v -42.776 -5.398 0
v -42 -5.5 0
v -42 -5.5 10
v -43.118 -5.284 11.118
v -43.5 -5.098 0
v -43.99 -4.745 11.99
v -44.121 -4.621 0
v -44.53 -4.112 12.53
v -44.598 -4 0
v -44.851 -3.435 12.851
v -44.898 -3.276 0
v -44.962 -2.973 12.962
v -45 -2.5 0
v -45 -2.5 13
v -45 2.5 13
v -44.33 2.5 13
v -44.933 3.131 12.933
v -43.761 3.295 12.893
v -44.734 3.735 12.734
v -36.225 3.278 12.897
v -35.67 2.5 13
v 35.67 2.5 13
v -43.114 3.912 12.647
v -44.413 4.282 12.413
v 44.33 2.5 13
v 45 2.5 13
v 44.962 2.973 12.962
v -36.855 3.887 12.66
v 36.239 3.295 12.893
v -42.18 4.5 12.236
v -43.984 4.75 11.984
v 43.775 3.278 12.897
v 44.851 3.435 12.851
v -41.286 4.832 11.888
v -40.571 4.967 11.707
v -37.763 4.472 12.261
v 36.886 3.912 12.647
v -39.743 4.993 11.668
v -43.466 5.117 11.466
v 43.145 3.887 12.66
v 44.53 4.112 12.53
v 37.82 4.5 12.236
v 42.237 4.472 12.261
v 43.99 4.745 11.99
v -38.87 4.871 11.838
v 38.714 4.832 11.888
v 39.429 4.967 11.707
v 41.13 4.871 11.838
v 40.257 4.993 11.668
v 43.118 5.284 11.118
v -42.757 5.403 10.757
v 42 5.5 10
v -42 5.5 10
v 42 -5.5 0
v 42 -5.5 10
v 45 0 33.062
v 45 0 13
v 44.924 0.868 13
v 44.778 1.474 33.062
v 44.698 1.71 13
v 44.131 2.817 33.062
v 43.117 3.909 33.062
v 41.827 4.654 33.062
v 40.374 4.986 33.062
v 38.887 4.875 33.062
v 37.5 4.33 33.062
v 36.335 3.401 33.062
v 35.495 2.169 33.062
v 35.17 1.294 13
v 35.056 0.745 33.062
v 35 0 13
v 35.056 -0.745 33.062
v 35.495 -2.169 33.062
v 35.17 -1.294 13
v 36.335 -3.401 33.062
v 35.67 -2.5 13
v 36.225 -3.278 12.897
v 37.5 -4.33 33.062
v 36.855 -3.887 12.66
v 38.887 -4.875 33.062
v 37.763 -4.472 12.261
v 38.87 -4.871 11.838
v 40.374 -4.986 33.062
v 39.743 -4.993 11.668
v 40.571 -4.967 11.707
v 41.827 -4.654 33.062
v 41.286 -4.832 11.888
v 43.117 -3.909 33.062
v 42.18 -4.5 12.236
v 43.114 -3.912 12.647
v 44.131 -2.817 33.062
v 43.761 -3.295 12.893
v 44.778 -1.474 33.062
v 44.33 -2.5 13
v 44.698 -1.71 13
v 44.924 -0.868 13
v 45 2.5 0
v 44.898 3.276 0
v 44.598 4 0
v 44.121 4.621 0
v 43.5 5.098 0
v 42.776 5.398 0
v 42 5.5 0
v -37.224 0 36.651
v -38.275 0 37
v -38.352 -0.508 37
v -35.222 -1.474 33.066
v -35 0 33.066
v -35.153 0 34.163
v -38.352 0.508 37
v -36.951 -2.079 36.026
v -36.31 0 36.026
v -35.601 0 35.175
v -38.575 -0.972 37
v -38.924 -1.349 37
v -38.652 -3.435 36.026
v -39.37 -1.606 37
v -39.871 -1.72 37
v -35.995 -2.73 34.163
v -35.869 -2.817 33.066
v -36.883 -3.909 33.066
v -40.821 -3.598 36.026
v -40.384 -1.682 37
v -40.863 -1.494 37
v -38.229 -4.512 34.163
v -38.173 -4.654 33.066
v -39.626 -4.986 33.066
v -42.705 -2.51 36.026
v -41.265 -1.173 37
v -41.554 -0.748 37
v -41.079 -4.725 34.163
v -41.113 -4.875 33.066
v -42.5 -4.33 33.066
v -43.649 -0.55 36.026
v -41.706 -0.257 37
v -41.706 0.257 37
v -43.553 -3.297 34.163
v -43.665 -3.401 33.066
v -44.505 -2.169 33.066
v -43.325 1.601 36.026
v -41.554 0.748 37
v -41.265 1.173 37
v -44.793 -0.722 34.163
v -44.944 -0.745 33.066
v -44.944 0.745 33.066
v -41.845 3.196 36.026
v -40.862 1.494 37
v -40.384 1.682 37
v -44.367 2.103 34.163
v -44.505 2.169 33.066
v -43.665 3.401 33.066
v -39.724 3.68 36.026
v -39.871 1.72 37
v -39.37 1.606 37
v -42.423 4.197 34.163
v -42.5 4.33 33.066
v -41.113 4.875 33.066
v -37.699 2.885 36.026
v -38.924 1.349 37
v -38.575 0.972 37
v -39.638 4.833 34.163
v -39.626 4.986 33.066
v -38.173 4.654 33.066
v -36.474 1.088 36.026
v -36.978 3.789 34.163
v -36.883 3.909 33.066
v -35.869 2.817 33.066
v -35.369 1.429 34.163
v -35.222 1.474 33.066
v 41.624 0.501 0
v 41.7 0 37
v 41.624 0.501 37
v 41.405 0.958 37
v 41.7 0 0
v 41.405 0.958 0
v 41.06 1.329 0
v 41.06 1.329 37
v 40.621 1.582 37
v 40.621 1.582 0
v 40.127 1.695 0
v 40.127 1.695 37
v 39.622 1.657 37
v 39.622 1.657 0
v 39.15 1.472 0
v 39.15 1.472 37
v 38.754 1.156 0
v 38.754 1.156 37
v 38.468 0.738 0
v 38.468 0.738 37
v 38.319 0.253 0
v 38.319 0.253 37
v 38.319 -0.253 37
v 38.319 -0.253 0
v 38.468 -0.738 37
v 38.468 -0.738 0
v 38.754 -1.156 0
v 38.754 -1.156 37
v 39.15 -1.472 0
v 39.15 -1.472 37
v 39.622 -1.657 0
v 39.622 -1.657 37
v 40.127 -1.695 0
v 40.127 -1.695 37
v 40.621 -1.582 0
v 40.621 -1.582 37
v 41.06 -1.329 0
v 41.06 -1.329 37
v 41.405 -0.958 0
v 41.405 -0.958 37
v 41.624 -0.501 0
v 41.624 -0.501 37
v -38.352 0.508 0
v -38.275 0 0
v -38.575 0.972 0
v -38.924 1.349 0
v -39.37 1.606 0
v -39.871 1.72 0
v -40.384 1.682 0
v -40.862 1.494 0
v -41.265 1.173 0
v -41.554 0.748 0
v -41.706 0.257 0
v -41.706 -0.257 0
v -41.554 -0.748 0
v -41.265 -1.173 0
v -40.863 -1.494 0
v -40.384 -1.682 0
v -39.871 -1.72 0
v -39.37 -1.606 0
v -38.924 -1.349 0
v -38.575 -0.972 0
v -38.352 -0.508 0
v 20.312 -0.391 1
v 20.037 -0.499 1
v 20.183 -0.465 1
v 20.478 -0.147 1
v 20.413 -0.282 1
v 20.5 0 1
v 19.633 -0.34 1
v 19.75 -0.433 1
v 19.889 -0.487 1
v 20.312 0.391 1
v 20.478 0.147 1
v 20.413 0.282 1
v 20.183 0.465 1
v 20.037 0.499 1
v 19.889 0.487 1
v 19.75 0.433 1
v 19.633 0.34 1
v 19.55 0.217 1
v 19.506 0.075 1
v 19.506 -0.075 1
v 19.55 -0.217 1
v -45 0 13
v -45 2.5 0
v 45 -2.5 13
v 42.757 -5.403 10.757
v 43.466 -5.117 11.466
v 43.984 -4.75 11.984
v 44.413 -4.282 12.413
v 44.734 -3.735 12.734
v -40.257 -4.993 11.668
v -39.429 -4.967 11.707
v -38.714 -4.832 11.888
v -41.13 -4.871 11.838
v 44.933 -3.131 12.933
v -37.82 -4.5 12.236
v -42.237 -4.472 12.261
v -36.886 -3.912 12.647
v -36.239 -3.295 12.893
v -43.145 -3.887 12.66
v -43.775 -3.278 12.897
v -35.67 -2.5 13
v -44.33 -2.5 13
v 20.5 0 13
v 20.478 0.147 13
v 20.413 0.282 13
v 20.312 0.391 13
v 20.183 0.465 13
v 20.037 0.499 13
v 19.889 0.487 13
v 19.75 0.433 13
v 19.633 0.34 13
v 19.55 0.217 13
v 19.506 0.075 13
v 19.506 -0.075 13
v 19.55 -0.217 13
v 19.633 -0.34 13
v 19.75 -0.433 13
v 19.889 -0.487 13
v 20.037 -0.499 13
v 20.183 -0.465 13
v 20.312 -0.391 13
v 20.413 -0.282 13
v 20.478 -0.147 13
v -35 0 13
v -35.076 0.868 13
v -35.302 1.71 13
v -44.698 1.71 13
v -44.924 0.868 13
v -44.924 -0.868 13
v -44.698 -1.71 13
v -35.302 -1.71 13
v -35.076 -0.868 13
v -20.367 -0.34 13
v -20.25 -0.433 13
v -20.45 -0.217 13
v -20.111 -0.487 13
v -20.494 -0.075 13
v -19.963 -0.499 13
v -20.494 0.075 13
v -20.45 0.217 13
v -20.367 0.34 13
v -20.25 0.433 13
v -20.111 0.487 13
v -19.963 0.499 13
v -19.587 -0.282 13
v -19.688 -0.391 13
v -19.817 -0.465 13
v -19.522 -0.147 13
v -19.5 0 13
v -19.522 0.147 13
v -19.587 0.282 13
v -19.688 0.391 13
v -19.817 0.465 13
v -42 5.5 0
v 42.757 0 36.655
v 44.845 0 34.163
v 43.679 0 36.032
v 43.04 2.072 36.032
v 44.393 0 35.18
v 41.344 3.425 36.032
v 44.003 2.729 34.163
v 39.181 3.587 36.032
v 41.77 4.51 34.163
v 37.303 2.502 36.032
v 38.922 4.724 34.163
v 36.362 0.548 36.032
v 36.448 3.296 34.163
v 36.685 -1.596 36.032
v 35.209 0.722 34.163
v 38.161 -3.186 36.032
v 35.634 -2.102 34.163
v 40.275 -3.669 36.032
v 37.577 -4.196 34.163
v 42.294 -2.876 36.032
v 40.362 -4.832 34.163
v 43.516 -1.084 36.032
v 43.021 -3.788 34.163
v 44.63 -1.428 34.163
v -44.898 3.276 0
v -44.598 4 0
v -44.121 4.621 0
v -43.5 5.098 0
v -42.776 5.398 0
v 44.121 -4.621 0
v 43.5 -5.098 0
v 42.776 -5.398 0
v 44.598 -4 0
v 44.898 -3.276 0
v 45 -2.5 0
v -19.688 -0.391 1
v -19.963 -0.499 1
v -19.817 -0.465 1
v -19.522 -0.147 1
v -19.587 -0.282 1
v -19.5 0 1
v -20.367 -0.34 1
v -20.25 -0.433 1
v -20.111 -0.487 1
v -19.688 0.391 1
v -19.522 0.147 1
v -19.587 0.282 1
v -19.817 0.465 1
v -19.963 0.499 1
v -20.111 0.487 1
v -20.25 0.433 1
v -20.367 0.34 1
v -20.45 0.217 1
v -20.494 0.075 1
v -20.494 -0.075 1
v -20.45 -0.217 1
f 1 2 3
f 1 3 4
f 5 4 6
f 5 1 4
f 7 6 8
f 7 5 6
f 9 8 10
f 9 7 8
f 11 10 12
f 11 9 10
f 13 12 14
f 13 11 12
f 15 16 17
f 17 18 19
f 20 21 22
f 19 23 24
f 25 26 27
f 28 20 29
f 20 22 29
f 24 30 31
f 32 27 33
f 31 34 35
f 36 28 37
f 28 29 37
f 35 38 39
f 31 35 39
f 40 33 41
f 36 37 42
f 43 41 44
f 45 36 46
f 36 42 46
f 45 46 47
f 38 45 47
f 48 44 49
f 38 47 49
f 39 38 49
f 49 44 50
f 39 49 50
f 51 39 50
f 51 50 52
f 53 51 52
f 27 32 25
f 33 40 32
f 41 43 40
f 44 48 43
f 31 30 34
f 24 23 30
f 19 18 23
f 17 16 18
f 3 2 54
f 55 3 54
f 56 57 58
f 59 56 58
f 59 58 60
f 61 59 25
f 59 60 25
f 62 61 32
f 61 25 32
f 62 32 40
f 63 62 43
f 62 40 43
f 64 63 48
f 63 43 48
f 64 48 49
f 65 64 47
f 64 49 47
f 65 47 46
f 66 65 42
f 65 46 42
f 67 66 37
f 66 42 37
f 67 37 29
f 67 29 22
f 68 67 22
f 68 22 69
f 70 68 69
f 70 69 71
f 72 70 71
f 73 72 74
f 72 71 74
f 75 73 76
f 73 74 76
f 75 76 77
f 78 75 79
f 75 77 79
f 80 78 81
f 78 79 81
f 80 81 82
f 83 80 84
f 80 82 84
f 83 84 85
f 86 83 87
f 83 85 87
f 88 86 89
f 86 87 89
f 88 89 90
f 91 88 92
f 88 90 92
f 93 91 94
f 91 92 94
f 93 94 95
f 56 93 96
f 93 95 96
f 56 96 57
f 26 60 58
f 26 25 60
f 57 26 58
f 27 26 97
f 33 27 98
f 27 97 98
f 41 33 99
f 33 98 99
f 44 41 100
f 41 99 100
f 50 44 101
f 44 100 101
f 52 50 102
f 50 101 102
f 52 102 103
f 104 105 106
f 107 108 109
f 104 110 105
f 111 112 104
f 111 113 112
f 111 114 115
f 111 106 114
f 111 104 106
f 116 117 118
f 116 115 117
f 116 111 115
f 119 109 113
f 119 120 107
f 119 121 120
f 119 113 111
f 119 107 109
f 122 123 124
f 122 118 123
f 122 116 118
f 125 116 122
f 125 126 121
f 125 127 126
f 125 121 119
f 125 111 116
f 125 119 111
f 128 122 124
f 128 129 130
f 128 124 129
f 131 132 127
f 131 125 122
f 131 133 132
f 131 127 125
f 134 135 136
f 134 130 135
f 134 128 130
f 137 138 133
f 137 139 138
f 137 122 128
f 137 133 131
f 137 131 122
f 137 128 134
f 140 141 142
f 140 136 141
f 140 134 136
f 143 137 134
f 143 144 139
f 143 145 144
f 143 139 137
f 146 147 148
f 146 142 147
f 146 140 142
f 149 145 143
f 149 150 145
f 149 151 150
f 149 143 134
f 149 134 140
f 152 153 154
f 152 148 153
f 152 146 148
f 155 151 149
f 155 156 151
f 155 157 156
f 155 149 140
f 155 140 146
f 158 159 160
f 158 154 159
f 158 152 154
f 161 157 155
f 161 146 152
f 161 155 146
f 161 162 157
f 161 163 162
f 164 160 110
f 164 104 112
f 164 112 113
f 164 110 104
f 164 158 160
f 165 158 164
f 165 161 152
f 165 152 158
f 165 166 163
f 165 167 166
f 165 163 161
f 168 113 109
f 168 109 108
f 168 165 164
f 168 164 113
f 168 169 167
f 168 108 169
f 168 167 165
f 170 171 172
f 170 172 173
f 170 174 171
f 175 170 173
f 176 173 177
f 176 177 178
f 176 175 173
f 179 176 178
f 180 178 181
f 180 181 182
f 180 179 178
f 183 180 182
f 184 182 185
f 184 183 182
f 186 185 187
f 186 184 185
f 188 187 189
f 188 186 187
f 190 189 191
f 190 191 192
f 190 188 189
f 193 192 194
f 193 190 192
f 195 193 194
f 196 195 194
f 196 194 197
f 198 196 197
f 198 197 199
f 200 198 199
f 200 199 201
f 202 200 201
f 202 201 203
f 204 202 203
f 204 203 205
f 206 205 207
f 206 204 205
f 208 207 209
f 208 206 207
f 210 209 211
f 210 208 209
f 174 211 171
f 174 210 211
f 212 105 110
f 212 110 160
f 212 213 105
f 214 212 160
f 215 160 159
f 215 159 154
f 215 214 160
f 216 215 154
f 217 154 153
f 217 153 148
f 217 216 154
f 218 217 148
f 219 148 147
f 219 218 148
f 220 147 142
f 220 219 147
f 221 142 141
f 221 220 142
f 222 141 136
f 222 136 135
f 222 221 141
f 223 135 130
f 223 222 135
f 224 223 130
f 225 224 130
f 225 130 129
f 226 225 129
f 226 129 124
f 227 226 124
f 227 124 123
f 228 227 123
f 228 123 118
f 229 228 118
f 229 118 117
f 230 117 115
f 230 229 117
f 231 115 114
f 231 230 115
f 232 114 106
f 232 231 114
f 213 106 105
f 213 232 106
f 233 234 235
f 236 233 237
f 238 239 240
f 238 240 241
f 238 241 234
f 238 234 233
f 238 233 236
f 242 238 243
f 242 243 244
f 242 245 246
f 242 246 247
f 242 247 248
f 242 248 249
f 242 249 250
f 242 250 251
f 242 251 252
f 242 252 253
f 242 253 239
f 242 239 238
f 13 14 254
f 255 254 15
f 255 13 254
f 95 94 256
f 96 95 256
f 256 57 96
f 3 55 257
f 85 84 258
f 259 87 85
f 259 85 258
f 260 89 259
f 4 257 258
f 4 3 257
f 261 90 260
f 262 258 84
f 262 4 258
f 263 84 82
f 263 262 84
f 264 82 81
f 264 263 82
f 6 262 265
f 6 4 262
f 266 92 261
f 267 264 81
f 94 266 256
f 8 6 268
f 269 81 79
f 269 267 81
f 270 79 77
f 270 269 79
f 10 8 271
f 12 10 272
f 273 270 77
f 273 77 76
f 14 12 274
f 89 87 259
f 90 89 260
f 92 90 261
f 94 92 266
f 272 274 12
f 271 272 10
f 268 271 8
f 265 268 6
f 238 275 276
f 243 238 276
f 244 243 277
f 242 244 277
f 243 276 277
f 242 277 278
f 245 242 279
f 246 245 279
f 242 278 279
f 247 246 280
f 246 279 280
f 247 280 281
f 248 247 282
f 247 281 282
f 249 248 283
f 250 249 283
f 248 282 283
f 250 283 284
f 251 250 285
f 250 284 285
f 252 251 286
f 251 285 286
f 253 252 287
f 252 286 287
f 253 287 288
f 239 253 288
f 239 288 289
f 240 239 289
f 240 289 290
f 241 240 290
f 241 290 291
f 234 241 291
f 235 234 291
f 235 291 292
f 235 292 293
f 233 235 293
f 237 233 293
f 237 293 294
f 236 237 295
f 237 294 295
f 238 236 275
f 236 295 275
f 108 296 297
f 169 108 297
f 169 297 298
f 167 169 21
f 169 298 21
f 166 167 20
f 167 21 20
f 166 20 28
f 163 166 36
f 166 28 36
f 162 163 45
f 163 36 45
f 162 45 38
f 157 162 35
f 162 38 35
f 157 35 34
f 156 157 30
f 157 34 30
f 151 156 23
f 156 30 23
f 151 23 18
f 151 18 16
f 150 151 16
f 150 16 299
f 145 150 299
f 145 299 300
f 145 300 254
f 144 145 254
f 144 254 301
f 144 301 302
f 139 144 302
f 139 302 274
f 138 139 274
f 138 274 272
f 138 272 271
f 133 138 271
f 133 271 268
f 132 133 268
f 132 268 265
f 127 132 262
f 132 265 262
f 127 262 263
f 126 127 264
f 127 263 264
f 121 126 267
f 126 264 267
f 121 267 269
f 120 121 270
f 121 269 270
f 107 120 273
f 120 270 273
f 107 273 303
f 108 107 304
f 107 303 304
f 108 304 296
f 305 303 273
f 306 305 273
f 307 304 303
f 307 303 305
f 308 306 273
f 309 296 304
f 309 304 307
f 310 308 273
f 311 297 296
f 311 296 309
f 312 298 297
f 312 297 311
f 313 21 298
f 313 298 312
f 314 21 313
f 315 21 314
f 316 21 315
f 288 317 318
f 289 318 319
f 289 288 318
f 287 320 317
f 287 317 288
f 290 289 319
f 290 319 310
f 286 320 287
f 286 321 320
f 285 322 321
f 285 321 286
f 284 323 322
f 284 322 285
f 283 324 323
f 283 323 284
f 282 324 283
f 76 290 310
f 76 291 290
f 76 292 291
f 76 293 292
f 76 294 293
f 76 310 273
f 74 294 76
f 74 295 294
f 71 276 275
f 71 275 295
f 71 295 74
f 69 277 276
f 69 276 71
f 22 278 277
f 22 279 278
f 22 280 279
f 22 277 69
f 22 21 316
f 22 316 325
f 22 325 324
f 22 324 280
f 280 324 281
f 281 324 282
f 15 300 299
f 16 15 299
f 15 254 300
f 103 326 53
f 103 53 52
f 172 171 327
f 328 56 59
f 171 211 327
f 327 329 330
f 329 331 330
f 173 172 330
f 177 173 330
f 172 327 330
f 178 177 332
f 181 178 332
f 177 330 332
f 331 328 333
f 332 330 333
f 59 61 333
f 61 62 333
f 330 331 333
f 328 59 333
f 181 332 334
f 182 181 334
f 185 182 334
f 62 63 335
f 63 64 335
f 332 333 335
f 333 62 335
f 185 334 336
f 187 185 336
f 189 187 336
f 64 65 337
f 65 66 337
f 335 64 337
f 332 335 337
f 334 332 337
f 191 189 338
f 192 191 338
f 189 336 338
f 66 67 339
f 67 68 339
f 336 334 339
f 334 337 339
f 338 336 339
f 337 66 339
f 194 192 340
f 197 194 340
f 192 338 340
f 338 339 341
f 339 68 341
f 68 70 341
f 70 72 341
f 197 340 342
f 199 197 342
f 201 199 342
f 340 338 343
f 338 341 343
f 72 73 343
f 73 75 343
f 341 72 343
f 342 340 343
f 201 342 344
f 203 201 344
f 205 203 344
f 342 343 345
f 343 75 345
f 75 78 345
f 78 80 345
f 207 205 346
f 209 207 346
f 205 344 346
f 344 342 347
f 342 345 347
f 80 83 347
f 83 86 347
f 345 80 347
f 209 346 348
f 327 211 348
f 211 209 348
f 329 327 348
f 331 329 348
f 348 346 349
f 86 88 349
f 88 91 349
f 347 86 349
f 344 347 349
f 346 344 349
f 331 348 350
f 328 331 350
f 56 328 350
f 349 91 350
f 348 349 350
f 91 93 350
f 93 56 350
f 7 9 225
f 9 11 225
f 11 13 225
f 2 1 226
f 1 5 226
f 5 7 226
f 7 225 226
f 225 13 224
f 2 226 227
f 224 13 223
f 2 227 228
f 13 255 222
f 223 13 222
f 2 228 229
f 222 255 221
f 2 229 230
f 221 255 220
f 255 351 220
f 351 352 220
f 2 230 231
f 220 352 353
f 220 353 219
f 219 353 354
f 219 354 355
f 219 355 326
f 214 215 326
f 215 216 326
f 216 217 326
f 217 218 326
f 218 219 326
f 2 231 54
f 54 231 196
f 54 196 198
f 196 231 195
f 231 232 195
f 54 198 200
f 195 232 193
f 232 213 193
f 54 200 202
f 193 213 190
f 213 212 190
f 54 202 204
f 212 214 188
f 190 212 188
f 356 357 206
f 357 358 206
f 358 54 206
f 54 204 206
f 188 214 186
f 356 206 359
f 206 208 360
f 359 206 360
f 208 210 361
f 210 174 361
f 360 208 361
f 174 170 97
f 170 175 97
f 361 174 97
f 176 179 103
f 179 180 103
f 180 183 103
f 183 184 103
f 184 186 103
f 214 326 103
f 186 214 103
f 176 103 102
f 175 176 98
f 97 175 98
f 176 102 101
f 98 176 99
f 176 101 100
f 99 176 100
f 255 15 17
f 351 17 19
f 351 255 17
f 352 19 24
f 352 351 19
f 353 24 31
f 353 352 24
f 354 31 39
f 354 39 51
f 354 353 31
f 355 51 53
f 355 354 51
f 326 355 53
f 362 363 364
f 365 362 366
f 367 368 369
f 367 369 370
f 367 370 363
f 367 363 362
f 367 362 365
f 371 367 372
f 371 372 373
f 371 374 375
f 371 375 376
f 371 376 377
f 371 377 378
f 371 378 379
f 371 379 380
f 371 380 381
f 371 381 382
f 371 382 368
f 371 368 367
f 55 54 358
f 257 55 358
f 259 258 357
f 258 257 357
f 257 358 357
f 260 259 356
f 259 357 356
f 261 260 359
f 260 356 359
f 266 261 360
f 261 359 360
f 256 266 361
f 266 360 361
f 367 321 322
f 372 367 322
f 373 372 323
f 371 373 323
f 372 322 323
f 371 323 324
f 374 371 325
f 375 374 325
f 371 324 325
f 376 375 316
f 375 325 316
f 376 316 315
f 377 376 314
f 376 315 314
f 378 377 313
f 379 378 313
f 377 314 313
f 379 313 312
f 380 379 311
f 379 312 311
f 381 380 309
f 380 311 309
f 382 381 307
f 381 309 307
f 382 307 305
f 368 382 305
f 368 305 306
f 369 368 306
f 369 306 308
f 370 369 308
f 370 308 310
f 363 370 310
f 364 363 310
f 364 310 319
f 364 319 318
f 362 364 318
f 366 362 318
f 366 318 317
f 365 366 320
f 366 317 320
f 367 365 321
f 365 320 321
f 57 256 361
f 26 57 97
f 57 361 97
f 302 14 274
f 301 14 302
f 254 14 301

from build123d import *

# Parameters (mm, degrees)
F0_W         = 90
F0_H         = 11
F0_R         = 1.725
F0_R_2       = 1.7
F1_DEPTH     = 13
F2_R         = 5
F2_R_2       = 1.7
F3_DEPTH     = 24
F4_R         = 1.725
F5_DEPTH     = 24
F6_R         = 0.5
F7_DEPTH     = 12
F8_T1_DEPTH  = 28
F8_T6_DEPTH  = 105
F8_S7_R      = 5
F8_T8_DEPTH  = 54
F8_S9_R      = 5
F8_T10_DEPTH = 54
F8_T14_DEPTH = 105
F8_S15_R     = 5
F8_T16_DEPTH = 54
F8_S17_R     = 5
F8_T18_DEPTH = 54


# Not quite as in the source:
# - a fillet or chamfer that OpenCascade refuses, or shapes differently, is made with other operations: its cross-section is extruded or revolved along the edge and cut away or added
# - a feature names something its author has since deleted; it is built from what else it names


with BuildPart() as f1:
    # F0 (on Top) → F1 (new body)
    with BuildSketch(Plane.XY):
        Rectangle(F0_W, F0_H)
        with Locations((-40, 0)):
            Circle(F0_R, mode=Mode.SUBTRACT)
        with Locations((40, 0)):
            Circle(F0_R_2, mode=Mode.SUBTRACT)
    extrude(amount=F1_DEPTH)

    # F2 (on face) → F3 (join)
    with BuildSketch(Plane.XY.offset(13)):
        with Locations((40, 0)):
            Circle(F2_R)
        with Locations((40, 0)):
            Circle(F2_R_2, mode=Mode.SUBTRACT)
    extrude(amount=F3_DEPTH)

    # F4 (on face) → F5 (join)
    with BuildSketch(Plane.XY.offset(13)):
        with BuildLine():
            ThreePointArc((-45, 0), (-40, -5), (-35, 0))
            ThreePointArc((-35, 0), (-40, 5), (-45, 0))
        make_face()
        with Locations((-40, 0)):
            Circle(F4_R, mode=Mode.SUBTRACT)
    extrude(amount=F5_DEPTH)

    # F6 (on face) → F7 (cut)
    with BuildSketch(Plane.XY.offset(13)):
        with Locations((-20, 0)):
            Circle(F6_R)
        with Locations((20, 0)):
            Circle(F6_R)
    extrude(amount=-F7_DEPTH, mode=Mode.SUBTRACT)

    # F8: fillet of radius 3 on 6 edges, made by hand

    # F8_s2 → F8_t1 (cut)
    with BuildSketch(Plane.XY.offset(-7.5)):
        with BuildLine():
            ThreePointArc((-42, -5.5), (-44.1213203436, -4.6213203436), (-45, -2.5))
            Line((-45, -2.5), (-45, -5.5))
            Line((-45, -5.5), (-42, -5.5))
        make_face()
        with BuildLine():
            ThreePointArc((-45, 2.5), (-44.1213203436, 4.6213203436), (-42, 5.5))
            Line((-42, 5.5), (-45, 5.5))
            Line((-45, 5.5), (-45, 2.5))
        make_face()
        with BuildLine():
            ThreePointArc((42, -5.5), (44.1213203436, -4.6213203436), (45, -2.5))
            Line((45, -2.5), (45, -5.5))
            Line((45, -5.5), (42, -5.5))
        make_face()
        with BuildLine():
            ThreePointArc((45, 2.5), (44.1213203436, 4.6213203436), (42, 5.5))
            Line((42, 5.5), (45, 5.5))
            Line((45, 5.5), (45, 2.5))
        make_face()
    extrude(amount=F8_T1_DEPTH, mode=Mode.SUBTRACT)


with BuildPart() as f8_tool4:
    # F8_s5 → F8_t6 (new body)
    with BuildSketch(Plane.YZ.offset(-52.5)):
        with BuildLine():
            ThreePointArc((-5.5, 10), (-4.6213203436, 12.1213203436), (-2.5, 13))
            Line((-2.5, 13), (-5.5, 13))
            Line((-5.5, 13), (-5.5, 10))
        make_face()
    extrude(amount=F8_T6_DEPTH)

    # F8_s7 → F8_t8 (cut, symmetric)
    with BuildSketch(Plane.XY.offset(11.5)):
        with Locations((-40, 0)):
            Circle(F8_S7_R)
    extrude(amount=F8_T8_DEPTH, both=True, mode=Mode.SUBTRACT)

    # F8_s9 → F8_t10 (cut, symmetric)
    with BuildSketch(Plane.XY.offset(11.5)):
        with Locations((40, 0)):
            Circle(F8_S9_R)
    extrude(amount=F8_T10_DEPTH, both=True, mode=Mode.SUBTRACT)


with BuildPart() as f1_1:
    add(f1.part)

    # F8_t3: cut F8_tool4
    add(f8_tool4.part, mode=Mode.SUBTRACT)


with BuildPart() as f8_tool12:
    # F8_s13 → F8_t14 (new body)
    with BuildSketch(Plane.YZ.offset(52.5)):
        with BuildLine():
            ThreePointArc((2.5, 13), (4.6213203436, 12.1213203436), (5.5, 10))
            Line((5.5, 10), (5.5, 13))
            Line((5.5, 13), (2.5, 13))
        make_face()
    extrude(amount=-F8_T14_DEPTH)

    # F8_s15 → F8_t16 (cut, symmetric)
    with BuildSketch(Plane.XY.offset(11.5)):
        with Locations((-40, 0)):
            Circle(F8_S15_R)
    extrude(amount=F8_T16_DEPTH, both=True, mode=Mode.SUBTRACT)

    # F8_s17 → F8_t18 (cut, symmetric)
    with BuildSketch(Plane.XY.offset(11.5)):
        with Locations((40, 0)):
            Circle(F8_S17_R)
    extrude(amount=F8_T18_DEPTH, both=True, mode=Mode.SUBTRACT)


with BuildPart() as f1_2:
    add(f1_1.part)

    # F8_t11: cut F8_tool12
    add(f8_tool12.part, mode=Mode.SUBTRACT)

    # F9: fillet of radius 4 on 2 edges, made by hand

    # F9_s1 → F9_t2 (revolve, cut)
    with BuildSketch(Plane.XZ):
        with BuildLine():
            ThreePointArc((-38.275, 37), (-35.9259147702, 35.6255485658), (-35, 33.0662517874))
            Line((-35, 33.0662517874), (-35, 37))
            Line((-35, 37), (-38.275, 37))
        make_face()
    revolve(axis=Axis((-40, 0, 37), (0, 0, -1)), mode=Mode.SUBTRACT)

    # F9_s3 → F9_t4 (revolve, cut)
    with BuildSketch(Plane.XZ):
        with BuildLine():
            ThreePointArc((41.7, 37), (44.0659419434, 35.6307727822), (45, 33.0617262665))
            Line((45, 33.0617262665), (45, 37))
            Line((45, 37), (41.7, 37))
        make_face()
    revolve(axis=Axis((40, 0, 37), (0, 0, 1)), mode=Mode.SUBTRACT)


solid = f1_2.part
